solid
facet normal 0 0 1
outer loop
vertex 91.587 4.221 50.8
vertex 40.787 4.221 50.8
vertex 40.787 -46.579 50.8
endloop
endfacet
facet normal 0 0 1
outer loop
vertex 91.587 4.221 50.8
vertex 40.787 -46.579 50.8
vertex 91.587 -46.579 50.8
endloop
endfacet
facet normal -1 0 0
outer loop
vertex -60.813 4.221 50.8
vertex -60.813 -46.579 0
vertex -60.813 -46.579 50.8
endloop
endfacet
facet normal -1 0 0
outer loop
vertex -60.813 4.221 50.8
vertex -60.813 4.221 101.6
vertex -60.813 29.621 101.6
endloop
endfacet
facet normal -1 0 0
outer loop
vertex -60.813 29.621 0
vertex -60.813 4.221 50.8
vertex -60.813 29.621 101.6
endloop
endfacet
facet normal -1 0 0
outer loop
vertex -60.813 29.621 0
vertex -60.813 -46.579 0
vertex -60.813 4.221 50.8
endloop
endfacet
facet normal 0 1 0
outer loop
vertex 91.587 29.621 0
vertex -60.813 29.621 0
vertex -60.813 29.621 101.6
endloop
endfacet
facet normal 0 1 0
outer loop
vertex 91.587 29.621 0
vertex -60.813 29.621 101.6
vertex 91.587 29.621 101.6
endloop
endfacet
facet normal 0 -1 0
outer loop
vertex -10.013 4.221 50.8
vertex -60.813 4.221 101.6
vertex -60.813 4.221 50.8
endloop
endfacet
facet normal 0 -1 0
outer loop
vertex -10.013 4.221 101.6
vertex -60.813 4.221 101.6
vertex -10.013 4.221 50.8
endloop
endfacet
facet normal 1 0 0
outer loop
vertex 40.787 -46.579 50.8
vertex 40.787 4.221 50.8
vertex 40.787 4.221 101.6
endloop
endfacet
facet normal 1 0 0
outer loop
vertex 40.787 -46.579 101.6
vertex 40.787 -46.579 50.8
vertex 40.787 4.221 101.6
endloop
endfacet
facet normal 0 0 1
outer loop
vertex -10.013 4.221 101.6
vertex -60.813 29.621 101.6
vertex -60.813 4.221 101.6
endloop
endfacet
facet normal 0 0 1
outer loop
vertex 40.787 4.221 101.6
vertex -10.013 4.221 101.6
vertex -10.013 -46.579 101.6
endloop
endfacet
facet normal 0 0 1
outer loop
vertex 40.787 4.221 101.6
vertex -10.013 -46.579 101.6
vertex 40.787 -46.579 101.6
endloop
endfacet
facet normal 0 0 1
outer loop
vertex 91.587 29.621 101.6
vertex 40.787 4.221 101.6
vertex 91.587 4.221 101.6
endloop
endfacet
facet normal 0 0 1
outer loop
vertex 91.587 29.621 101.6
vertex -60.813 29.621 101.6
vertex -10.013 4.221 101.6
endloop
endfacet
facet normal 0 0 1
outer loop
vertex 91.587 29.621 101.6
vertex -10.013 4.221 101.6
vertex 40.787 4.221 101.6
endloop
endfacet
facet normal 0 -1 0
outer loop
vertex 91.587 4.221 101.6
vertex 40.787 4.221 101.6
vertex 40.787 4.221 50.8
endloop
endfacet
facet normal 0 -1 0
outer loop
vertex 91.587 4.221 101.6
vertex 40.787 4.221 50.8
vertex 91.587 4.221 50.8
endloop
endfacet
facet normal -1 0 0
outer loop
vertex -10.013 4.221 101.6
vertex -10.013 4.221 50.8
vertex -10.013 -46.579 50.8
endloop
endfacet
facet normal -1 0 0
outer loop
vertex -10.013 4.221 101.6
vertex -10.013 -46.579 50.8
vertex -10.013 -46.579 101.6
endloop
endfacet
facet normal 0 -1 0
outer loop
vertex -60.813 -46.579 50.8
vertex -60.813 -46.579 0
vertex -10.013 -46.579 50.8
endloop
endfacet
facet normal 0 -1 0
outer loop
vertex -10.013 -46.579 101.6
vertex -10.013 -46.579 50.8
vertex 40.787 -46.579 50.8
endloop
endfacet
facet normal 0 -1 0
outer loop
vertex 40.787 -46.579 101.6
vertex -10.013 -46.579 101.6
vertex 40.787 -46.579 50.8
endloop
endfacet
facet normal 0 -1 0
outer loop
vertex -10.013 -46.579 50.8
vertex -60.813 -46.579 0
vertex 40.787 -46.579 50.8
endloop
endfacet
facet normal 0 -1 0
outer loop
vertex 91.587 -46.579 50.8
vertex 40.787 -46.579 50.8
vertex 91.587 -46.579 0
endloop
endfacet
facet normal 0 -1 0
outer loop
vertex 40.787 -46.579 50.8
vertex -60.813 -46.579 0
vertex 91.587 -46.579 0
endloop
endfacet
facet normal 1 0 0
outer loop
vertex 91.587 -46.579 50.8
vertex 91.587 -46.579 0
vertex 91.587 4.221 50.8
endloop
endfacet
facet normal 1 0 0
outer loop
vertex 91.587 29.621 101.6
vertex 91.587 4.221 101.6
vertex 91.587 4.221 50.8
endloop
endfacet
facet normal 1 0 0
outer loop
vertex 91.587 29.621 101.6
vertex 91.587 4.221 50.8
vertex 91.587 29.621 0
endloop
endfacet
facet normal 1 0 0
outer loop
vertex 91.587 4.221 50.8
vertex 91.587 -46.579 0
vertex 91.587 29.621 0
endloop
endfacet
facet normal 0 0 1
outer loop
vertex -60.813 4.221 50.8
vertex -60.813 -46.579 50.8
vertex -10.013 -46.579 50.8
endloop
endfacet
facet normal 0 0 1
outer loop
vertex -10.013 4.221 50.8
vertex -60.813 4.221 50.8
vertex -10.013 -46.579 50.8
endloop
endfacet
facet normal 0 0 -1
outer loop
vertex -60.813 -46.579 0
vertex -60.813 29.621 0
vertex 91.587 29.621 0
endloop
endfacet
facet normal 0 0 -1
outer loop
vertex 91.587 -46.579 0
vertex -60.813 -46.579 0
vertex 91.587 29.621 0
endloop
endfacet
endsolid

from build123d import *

# Parameters (mm, degrees)
F0_W     = 152.4
F0_H     = 76.2
F1_DEPTH = 101.6
F2_W     = 50.8
F2_H     = 50.8
F3_DEPTH = 50.8
F4_DEPTH = 50.8


with BuildPart() as f1:
    # F0 (on Top) → F1 (new body)
    with BuildSketch(Plane.XY):
        with Locations((15.3874829412, -8.4786337945)):
            Rectangle(F0_W, F0_H)
    extrude(amount=F1_DEPTH)

    # F2 (on face) → F3 (cut)
    with BuildSketch(Plane.XZ.offset(46.5786337945)):
        with Locations((-35.4125170588, 76.2)):
            Rectangle(F2_W, F2_H)
    extrude(amount=-F3_DEPTH, mode=Mode.SUBTRACT)

    # F2 (on face) → F4 (cut)
    with BuildSketch(Plane.XZ.offset(46.5786337945)):
        with Locations((66.1874829412, 76.2)):
            Rectangle(F2_W, F2_H)
    extrude(amount=-F4_DEPTH, mode=Mode.SUBTRACT)


solid = f1.part
